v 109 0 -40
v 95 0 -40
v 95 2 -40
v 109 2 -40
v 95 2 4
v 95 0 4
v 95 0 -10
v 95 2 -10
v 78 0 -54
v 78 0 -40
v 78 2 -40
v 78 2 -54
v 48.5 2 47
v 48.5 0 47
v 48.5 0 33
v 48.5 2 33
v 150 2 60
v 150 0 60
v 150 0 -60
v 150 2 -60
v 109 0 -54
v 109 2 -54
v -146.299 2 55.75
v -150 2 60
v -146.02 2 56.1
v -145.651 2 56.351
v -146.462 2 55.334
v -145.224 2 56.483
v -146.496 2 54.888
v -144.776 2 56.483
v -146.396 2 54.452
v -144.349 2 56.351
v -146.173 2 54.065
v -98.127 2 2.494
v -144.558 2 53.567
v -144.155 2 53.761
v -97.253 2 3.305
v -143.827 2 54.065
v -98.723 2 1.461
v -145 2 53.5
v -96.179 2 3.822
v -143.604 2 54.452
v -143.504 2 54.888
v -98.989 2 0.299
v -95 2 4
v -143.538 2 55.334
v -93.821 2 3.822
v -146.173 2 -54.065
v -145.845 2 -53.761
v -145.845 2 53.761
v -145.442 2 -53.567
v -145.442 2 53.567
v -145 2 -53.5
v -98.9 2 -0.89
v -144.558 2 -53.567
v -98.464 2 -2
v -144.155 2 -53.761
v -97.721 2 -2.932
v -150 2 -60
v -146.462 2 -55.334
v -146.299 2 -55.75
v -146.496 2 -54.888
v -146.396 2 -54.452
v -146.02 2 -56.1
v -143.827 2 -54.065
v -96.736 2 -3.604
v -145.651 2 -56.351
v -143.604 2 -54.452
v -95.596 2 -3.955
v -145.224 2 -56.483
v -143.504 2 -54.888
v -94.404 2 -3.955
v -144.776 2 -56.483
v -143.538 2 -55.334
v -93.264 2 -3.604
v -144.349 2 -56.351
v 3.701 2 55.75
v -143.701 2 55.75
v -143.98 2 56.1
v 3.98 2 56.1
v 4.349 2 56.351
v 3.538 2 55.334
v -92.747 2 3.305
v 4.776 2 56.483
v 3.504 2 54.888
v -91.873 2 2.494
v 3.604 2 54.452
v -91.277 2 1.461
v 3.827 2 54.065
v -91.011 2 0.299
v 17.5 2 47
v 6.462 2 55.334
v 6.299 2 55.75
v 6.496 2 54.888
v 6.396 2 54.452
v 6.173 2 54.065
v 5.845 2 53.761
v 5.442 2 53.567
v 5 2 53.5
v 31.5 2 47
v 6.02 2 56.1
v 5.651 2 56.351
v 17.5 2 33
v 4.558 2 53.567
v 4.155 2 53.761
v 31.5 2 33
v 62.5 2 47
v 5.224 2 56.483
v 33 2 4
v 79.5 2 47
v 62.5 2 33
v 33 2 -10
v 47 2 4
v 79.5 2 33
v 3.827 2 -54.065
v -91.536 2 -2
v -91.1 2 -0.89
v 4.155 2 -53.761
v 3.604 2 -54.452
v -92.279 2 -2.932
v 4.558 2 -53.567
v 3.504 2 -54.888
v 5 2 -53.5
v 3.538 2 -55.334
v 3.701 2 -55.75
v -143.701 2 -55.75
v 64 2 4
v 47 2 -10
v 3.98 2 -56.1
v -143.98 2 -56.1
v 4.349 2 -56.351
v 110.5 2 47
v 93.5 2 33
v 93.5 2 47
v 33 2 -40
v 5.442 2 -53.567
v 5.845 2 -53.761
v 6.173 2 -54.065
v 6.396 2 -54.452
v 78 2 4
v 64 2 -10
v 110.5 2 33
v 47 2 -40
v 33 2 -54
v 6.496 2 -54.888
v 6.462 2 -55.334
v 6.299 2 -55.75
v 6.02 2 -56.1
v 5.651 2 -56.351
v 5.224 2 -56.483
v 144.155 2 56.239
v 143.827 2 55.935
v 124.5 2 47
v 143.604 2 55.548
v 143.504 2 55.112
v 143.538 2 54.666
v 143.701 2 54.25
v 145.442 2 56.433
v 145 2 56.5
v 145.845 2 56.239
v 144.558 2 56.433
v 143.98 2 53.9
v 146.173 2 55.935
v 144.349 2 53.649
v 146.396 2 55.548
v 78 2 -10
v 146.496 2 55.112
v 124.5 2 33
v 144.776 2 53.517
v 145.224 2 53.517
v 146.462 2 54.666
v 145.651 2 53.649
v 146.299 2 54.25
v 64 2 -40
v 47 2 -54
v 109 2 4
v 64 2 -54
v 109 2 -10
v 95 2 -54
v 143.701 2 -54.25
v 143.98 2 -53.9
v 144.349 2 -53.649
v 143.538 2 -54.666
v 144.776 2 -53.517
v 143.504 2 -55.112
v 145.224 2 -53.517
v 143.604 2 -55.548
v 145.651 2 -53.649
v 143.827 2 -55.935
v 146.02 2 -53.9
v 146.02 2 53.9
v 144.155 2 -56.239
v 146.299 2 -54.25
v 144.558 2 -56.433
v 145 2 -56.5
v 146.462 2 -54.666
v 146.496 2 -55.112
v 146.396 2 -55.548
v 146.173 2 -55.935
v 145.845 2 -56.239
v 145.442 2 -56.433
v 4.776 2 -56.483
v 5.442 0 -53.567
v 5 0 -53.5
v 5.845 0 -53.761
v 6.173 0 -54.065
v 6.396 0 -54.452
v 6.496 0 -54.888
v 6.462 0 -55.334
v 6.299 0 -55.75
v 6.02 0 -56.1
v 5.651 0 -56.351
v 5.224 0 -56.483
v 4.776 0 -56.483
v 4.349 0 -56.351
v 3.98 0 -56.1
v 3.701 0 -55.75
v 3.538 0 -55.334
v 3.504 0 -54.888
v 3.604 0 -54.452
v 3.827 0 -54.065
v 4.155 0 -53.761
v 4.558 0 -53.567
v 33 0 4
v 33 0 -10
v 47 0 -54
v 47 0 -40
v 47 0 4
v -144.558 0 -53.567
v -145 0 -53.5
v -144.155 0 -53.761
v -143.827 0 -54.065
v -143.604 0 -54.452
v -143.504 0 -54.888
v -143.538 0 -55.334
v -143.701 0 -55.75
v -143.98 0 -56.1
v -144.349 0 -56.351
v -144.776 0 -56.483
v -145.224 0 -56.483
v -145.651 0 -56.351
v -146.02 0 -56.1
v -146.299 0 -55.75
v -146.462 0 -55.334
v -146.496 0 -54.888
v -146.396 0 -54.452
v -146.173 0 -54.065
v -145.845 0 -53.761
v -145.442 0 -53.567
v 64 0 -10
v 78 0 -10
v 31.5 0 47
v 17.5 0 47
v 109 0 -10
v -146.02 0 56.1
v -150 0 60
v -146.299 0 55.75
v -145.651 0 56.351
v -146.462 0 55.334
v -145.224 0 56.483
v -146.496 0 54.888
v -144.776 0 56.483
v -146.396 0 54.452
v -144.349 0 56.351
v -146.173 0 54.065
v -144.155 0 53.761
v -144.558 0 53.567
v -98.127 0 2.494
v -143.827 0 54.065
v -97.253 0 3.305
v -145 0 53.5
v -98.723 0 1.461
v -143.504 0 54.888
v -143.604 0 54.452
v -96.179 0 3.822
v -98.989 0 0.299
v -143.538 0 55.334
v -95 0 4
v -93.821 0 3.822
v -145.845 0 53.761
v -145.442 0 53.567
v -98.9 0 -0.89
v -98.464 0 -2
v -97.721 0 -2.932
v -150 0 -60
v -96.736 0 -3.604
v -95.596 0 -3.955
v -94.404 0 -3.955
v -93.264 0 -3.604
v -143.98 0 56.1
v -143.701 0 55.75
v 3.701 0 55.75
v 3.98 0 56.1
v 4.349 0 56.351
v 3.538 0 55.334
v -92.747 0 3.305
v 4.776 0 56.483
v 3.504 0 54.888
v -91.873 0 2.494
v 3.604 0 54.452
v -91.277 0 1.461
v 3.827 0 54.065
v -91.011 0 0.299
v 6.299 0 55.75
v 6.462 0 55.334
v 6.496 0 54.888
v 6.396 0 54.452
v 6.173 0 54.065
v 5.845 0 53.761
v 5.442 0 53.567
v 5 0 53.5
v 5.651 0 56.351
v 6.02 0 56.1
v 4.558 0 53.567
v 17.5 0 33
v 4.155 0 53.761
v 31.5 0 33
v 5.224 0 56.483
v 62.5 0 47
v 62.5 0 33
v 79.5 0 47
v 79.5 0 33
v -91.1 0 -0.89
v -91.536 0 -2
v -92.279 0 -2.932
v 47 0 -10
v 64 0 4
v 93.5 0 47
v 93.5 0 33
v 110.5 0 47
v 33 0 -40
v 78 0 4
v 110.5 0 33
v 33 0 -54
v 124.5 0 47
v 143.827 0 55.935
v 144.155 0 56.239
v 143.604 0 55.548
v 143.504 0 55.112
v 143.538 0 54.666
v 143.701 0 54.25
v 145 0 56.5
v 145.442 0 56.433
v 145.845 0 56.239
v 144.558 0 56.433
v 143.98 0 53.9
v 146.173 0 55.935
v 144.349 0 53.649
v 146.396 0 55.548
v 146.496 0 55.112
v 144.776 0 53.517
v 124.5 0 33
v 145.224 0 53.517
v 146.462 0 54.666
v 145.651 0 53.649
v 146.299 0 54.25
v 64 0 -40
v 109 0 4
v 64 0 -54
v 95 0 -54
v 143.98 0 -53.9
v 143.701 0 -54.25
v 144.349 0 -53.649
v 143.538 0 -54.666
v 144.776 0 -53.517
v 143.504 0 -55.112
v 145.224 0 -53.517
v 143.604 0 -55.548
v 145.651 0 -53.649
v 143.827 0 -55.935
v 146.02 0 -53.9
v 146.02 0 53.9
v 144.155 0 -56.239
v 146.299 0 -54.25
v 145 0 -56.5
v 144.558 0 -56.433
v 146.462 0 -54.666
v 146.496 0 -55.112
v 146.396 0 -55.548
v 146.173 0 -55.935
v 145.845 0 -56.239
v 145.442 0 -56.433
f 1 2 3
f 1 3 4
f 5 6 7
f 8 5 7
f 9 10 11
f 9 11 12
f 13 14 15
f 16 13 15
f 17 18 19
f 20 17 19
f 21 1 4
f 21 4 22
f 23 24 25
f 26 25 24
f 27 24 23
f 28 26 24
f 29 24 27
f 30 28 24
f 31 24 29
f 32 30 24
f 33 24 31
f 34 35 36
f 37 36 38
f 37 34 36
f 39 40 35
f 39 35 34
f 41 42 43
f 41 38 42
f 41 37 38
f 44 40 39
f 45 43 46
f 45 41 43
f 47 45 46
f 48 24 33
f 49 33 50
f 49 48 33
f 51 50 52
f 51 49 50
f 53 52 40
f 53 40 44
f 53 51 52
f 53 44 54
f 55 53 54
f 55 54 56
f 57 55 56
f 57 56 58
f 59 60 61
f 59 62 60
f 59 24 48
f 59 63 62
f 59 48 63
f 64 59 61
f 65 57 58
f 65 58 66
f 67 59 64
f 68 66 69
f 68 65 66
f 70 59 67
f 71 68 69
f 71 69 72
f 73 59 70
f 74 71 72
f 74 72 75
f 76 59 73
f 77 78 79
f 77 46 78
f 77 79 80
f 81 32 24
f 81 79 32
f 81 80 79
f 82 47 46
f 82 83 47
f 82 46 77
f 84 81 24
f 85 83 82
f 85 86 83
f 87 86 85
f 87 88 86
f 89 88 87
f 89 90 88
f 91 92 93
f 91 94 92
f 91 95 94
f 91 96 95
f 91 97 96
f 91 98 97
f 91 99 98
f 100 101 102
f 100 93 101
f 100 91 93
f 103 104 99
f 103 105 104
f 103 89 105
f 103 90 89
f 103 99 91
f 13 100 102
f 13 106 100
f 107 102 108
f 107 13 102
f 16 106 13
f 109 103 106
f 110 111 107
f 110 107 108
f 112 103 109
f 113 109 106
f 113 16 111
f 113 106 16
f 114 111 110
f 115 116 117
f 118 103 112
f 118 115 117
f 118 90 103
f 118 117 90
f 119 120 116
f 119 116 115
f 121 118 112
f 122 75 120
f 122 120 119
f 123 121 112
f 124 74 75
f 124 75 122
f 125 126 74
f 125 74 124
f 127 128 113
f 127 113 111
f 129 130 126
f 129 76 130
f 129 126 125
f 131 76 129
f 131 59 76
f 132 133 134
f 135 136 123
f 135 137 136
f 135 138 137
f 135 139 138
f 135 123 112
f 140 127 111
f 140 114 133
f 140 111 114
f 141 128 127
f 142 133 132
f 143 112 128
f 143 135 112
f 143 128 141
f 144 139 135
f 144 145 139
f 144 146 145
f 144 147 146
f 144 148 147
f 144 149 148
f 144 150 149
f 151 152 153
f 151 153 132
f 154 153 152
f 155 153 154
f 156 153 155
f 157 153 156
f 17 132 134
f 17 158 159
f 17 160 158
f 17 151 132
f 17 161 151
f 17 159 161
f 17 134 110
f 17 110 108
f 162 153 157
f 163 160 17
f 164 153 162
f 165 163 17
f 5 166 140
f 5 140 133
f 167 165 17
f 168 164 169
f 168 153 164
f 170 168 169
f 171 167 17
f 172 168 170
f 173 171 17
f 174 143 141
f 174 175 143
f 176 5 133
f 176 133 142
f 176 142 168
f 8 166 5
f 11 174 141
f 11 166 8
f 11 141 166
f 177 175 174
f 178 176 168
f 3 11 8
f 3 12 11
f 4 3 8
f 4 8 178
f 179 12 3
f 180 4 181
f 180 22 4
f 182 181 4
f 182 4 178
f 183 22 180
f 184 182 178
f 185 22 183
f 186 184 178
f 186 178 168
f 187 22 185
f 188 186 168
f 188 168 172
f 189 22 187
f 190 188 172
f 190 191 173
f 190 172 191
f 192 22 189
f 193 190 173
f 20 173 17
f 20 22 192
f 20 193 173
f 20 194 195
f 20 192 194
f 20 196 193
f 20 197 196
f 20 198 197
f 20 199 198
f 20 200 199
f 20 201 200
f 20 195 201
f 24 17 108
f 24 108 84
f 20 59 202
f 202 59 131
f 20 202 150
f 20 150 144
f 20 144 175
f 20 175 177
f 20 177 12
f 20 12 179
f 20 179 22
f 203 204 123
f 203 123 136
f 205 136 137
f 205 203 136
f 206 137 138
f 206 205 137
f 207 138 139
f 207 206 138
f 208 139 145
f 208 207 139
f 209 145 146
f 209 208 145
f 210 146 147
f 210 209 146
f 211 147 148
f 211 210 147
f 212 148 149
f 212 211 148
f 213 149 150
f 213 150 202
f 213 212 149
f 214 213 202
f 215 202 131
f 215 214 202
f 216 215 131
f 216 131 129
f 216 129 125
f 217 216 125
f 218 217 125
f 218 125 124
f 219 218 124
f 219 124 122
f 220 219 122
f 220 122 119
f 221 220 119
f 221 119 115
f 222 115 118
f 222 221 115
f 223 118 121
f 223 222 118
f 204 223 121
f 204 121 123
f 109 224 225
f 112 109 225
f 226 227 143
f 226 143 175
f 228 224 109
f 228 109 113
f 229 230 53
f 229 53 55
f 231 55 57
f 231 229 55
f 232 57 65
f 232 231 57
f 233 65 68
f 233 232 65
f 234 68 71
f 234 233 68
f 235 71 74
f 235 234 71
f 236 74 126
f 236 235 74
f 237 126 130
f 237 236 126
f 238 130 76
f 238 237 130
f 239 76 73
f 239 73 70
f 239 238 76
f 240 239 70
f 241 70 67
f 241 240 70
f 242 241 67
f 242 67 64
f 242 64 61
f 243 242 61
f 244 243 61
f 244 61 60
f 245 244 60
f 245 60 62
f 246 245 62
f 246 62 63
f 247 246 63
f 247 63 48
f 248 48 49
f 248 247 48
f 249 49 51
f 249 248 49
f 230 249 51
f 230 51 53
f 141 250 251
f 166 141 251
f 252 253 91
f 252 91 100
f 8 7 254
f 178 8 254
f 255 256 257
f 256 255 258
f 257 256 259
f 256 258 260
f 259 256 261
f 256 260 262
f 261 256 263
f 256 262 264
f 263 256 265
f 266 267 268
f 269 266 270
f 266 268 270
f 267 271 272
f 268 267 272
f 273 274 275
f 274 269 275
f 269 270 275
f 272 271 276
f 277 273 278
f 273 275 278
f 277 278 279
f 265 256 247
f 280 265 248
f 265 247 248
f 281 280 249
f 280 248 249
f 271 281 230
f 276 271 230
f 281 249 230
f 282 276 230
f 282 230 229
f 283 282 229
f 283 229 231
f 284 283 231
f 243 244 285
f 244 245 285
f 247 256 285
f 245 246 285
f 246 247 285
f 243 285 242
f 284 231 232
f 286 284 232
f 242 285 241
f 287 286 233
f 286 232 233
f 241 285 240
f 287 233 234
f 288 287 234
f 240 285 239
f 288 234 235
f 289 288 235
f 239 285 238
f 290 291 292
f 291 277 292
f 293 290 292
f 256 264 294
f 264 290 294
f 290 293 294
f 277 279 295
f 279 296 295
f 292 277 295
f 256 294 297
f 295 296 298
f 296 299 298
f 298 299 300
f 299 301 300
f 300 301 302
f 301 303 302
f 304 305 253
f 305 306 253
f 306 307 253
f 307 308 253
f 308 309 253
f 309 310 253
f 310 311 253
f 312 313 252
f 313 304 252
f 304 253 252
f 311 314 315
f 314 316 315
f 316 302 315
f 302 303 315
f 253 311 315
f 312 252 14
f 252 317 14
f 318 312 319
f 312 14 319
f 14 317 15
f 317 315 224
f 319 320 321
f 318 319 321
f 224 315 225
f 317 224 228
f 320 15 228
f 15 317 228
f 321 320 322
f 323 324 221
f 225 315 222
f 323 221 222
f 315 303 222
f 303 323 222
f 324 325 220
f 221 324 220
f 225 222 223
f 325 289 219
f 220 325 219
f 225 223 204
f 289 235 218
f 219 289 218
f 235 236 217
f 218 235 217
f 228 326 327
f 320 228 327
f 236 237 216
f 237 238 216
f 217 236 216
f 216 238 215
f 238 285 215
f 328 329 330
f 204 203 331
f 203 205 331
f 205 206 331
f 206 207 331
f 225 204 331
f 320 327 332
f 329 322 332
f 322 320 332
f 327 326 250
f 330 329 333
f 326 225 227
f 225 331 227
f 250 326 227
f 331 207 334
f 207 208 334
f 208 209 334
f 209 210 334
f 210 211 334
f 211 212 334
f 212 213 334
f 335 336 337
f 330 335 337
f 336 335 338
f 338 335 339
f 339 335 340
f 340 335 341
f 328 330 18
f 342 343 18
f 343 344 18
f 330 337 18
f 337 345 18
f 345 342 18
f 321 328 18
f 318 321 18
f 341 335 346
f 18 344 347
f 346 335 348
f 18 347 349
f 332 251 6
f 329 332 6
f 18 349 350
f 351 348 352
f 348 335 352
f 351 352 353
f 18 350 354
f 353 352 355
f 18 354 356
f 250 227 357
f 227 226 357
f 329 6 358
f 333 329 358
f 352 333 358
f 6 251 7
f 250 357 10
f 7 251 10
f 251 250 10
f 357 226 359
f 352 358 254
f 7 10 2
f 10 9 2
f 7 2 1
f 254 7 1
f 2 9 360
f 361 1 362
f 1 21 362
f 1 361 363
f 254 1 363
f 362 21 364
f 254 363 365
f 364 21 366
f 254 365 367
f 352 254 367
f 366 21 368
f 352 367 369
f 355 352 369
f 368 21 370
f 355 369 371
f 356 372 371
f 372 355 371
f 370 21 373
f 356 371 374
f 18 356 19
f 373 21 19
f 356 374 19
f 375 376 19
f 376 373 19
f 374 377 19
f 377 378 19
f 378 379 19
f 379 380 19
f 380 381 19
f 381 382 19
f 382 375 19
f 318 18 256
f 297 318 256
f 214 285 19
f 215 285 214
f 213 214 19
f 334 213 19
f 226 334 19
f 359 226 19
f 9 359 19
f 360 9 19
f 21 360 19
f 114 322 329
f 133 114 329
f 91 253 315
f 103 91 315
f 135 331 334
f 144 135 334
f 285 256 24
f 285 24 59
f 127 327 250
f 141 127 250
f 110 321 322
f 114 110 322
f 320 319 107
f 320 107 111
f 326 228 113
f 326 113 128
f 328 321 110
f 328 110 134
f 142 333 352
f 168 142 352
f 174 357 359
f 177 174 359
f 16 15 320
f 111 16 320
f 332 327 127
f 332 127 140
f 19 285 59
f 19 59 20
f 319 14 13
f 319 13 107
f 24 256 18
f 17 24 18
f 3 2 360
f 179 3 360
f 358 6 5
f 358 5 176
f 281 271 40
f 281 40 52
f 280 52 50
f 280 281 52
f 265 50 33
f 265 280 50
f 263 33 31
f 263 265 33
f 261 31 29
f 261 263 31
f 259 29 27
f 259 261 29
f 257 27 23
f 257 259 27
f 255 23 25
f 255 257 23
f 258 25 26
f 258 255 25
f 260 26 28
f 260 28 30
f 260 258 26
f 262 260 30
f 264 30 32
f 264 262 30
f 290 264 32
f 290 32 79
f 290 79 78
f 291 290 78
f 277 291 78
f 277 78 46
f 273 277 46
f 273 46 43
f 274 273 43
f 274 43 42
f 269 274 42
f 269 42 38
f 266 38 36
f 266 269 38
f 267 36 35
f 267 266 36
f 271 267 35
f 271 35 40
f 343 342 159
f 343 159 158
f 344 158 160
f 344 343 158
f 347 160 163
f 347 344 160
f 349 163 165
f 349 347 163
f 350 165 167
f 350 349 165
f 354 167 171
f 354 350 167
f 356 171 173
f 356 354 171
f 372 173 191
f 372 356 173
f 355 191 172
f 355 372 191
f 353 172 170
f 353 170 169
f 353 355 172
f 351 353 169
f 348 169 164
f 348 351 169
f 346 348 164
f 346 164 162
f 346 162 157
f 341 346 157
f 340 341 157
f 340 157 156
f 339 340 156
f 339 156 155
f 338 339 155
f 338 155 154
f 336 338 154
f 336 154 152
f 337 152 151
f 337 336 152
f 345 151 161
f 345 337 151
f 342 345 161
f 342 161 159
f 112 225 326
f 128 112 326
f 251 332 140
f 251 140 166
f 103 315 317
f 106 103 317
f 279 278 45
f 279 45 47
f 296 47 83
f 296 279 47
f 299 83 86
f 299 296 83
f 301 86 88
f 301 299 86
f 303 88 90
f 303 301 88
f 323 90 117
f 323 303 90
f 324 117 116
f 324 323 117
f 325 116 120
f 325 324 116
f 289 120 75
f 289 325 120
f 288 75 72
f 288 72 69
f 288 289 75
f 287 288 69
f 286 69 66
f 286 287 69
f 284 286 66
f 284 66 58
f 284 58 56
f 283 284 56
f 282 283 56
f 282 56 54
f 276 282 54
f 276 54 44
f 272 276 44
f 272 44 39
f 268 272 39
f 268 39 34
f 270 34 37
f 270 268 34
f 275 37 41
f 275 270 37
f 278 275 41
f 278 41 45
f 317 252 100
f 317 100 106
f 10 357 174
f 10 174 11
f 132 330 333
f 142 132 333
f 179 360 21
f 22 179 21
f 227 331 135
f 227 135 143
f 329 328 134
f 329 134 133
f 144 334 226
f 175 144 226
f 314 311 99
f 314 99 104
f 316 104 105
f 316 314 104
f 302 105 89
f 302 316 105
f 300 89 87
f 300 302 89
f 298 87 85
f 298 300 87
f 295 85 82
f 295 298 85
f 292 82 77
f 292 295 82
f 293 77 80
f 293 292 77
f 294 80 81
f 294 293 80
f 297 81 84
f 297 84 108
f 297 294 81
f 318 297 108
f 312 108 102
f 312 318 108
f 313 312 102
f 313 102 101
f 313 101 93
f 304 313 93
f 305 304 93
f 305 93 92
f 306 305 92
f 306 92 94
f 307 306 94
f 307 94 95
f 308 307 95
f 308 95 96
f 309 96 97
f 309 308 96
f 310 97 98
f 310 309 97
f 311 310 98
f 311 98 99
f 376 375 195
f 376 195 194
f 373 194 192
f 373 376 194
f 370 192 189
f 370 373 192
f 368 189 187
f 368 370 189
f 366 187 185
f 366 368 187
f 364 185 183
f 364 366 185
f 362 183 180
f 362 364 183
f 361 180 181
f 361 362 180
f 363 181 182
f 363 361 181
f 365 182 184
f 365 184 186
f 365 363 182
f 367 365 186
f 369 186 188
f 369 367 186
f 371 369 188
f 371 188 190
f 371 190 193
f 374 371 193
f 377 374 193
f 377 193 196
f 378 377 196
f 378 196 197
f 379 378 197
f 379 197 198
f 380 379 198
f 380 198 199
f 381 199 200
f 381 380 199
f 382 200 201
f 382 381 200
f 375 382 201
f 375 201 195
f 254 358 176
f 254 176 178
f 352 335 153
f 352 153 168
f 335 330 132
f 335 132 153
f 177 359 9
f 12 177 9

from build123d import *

# Parameters (mm, degrees)
SKETCH1_W           = 300
SKETCH1_H           = 120
SKETCH1_R           = 4
SKETCH1_R_2         = 1.5
SKETCH1_W_2         = 14
SKETCH1_H_2         = 14
BOSS_EXTRUDE1_DEPTH = 2


with BuildPart() as part:
    # Sketch1 → Boss-Extrude1 (new body)
    with BuildSketch(Plane(origin=(0, 0, 0), x_dir=(1, 0, 0), z_dir=(0, 1, 0))):
        Rectangle(SKETCH1_W, SKETCH1_H)
        with Locations(Location((-95, 0, 0), (0, 0, 270))):
            Circle(SKETCH1_R, mode=Mode.SUBTRACT)
        with Locations(Location((-145, 55, 0), (0, 0, 270))):
            Circle(SKETCH1_R_2, mode=Mode.SUBTRACT)
        with Locations(Location((145, 55, 0), (0, 0, 90))):
            Circle(SKETCH1_R_2, mode=Mode.SUBTRACT)
        with Locations(Location((-145, -55, 0), (0, 0, 90))):
            Circle(SKETCH1_R_2, mode=Mode.SUBTRACT)
        with Locations(Location((145, -55, 0), (0, 0, 270))):
            Circle(SKETCH1_R_2, mode=Mode.SUBTRACT)
        with Locations(Location((5, 55, 0), (0, 0, 270))):
            Circle(SKETCH1_R_2, mode=Mode.SUBTRACT)
        with Locations(Location((5, -55, 0), (0, 0, 90))):
            Circle(SKETCH1_R_2, mode=Mode.SUBTRACT)
        with Locations((24.5, -40)):
            Rectangle(SKETCH1_W_2, SKETCH1_H_2, mode=Mode.SUBTRACT)
        with Locations((40, 3)):
            Rectangle(SKETCH1_W_2, SKETCH1_H_2, mode=Mode.SUBTRACT)
        with Locations((71, 3)):
            Rectangle(SKETCH1_W_2, SKETCH1_H_2, mode=Mode.SUBTRACT)
        with Locations((102, 3)):
            Rectangle(SKETCH1_W_2, SKETCH1_H_2, mode=Mode.SUBTRACT)
        with Locations((55.5, -40)):
            Rectangle(SKETCH1_W_2, SKETCH1_H_2, mode=Mode.SUBTRACT)
        with Locations((86.5, -40)):
            Rectangle(SKETCH1_W_2, SKETCH1_H_2, mode=Mode.SUBTRACT)
        with Locations((117.5, -40)):
            Rectangle(SKETCH1_W_2, SKETCH1_H_2, mode=Mode.SUBTRACT)
        with Locations((40, 47)):
            Rectangle(SKETCH1_W_2, SKETCH1_H_2, mode=Mode.SUBTRACT)
        with Locations((71, 47)):
            Rectangle(SKETCH1_W_2, SKETCH1_H_2, mode=Mode.SUBTRACT)
        with Locations((102, 47)):
            Rectangle(SKETCH1_W_2, SKETCH1_H_2, mode=Mode.SUBTRACT)
    extrude(amount=BOSS_EXTRUDE1_DEPTH)


solid = part.part
